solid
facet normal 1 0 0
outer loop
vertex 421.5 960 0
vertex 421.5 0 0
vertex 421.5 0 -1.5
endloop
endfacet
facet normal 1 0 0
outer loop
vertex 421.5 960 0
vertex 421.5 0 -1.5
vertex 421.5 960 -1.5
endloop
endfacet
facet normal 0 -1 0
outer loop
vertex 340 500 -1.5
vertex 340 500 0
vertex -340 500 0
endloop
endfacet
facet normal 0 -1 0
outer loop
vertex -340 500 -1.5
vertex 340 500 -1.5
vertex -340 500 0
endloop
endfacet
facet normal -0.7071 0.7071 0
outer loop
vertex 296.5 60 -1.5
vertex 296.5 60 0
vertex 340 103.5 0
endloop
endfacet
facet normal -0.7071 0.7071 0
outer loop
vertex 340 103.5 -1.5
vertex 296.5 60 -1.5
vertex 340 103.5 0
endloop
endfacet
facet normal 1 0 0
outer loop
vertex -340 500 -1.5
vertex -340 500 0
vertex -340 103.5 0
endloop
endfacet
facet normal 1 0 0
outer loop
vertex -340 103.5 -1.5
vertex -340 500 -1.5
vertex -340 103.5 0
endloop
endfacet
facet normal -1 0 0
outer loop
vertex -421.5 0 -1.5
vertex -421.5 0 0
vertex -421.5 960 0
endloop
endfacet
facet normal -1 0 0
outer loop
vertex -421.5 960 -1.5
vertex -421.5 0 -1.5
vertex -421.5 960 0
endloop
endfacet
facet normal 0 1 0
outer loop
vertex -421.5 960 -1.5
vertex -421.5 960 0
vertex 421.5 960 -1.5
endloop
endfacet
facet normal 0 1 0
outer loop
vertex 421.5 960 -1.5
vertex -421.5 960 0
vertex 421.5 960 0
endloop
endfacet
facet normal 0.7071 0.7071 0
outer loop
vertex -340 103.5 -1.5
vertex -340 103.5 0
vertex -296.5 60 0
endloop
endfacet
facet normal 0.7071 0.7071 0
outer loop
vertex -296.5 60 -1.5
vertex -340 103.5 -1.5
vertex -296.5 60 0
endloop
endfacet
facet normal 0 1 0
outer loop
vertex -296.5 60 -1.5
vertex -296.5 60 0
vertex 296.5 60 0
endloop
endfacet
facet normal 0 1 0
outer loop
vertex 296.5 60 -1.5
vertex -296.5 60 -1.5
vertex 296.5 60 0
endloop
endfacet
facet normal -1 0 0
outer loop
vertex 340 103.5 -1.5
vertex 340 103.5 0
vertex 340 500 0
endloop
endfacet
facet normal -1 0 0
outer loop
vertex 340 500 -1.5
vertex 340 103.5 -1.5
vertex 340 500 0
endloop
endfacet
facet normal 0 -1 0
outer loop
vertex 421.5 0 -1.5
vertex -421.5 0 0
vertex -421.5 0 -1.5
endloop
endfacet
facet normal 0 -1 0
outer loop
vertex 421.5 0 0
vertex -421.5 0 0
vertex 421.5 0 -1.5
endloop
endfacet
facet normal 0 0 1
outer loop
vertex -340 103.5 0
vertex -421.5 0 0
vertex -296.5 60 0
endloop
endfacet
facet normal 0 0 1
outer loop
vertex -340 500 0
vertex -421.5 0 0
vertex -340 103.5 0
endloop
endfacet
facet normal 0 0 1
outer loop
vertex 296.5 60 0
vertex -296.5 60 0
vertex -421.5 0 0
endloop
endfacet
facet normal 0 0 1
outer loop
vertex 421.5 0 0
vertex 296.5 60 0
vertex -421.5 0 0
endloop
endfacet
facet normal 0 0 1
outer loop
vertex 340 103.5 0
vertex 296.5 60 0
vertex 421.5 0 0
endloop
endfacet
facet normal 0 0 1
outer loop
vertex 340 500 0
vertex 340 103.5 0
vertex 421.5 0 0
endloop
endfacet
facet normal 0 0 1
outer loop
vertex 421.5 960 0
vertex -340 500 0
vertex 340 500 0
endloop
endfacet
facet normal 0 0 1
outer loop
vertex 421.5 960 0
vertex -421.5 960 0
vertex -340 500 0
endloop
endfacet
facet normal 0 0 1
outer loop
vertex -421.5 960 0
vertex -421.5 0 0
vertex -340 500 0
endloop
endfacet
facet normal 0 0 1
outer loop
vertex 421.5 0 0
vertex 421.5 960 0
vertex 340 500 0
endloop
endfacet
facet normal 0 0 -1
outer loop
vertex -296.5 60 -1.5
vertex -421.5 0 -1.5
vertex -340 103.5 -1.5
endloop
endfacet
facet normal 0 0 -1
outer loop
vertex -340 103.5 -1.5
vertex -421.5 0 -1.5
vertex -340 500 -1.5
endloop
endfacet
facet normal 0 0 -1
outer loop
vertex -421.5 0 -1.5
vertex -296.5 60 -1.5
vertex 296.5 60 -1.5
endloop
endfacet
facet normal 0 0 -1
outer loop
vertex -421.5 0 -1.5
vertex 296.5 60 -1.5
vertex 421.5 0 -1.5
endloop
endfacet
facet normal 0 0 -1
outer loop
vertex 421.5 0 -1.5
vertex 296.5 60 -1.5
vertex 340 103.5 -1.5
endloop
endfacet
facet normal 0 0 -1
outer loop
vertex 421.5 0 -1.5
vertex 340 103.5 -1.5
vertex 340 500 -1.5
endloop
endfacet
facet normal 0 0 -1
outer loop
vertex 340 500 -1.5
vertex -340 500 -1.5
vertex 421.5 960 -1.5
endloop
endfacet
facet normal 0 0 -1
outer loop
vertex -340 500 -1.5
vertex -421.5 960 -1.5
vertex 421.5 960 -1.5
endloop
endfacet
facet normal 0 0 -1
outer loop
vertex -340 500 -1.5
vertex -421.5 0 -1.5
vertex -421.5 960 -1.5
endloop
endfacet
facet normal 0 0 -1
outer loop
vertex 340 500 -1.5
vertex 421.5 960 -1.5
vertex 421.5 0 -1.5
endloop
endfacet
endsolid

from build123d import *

# Parameters (mm, degrees)
SKETCH1_W          = 843
SKETCH1_H          = 960
BASE_FLANGE1_DEPTH = 1.5


# Sheet-metal steps are written as plain solids
with BuildPart() as part:
    # Sketch1 → Base-Flange1 (new body)
    with BuildSketch(Plane.XY):
        with Locations((0, 480)):
            Rectangle(SKETCH1_W, SKETCH1_H)
        Polygon((-340, 500), (-340, 103.5), (-296.5, 60), (296.5, 60), (340, 103.5), (340, 500), align=None, mode=Mode.SUBTRACT)
    extrude(amount=-BASE_FLANGE1_DEPTH)


solid = part.part
